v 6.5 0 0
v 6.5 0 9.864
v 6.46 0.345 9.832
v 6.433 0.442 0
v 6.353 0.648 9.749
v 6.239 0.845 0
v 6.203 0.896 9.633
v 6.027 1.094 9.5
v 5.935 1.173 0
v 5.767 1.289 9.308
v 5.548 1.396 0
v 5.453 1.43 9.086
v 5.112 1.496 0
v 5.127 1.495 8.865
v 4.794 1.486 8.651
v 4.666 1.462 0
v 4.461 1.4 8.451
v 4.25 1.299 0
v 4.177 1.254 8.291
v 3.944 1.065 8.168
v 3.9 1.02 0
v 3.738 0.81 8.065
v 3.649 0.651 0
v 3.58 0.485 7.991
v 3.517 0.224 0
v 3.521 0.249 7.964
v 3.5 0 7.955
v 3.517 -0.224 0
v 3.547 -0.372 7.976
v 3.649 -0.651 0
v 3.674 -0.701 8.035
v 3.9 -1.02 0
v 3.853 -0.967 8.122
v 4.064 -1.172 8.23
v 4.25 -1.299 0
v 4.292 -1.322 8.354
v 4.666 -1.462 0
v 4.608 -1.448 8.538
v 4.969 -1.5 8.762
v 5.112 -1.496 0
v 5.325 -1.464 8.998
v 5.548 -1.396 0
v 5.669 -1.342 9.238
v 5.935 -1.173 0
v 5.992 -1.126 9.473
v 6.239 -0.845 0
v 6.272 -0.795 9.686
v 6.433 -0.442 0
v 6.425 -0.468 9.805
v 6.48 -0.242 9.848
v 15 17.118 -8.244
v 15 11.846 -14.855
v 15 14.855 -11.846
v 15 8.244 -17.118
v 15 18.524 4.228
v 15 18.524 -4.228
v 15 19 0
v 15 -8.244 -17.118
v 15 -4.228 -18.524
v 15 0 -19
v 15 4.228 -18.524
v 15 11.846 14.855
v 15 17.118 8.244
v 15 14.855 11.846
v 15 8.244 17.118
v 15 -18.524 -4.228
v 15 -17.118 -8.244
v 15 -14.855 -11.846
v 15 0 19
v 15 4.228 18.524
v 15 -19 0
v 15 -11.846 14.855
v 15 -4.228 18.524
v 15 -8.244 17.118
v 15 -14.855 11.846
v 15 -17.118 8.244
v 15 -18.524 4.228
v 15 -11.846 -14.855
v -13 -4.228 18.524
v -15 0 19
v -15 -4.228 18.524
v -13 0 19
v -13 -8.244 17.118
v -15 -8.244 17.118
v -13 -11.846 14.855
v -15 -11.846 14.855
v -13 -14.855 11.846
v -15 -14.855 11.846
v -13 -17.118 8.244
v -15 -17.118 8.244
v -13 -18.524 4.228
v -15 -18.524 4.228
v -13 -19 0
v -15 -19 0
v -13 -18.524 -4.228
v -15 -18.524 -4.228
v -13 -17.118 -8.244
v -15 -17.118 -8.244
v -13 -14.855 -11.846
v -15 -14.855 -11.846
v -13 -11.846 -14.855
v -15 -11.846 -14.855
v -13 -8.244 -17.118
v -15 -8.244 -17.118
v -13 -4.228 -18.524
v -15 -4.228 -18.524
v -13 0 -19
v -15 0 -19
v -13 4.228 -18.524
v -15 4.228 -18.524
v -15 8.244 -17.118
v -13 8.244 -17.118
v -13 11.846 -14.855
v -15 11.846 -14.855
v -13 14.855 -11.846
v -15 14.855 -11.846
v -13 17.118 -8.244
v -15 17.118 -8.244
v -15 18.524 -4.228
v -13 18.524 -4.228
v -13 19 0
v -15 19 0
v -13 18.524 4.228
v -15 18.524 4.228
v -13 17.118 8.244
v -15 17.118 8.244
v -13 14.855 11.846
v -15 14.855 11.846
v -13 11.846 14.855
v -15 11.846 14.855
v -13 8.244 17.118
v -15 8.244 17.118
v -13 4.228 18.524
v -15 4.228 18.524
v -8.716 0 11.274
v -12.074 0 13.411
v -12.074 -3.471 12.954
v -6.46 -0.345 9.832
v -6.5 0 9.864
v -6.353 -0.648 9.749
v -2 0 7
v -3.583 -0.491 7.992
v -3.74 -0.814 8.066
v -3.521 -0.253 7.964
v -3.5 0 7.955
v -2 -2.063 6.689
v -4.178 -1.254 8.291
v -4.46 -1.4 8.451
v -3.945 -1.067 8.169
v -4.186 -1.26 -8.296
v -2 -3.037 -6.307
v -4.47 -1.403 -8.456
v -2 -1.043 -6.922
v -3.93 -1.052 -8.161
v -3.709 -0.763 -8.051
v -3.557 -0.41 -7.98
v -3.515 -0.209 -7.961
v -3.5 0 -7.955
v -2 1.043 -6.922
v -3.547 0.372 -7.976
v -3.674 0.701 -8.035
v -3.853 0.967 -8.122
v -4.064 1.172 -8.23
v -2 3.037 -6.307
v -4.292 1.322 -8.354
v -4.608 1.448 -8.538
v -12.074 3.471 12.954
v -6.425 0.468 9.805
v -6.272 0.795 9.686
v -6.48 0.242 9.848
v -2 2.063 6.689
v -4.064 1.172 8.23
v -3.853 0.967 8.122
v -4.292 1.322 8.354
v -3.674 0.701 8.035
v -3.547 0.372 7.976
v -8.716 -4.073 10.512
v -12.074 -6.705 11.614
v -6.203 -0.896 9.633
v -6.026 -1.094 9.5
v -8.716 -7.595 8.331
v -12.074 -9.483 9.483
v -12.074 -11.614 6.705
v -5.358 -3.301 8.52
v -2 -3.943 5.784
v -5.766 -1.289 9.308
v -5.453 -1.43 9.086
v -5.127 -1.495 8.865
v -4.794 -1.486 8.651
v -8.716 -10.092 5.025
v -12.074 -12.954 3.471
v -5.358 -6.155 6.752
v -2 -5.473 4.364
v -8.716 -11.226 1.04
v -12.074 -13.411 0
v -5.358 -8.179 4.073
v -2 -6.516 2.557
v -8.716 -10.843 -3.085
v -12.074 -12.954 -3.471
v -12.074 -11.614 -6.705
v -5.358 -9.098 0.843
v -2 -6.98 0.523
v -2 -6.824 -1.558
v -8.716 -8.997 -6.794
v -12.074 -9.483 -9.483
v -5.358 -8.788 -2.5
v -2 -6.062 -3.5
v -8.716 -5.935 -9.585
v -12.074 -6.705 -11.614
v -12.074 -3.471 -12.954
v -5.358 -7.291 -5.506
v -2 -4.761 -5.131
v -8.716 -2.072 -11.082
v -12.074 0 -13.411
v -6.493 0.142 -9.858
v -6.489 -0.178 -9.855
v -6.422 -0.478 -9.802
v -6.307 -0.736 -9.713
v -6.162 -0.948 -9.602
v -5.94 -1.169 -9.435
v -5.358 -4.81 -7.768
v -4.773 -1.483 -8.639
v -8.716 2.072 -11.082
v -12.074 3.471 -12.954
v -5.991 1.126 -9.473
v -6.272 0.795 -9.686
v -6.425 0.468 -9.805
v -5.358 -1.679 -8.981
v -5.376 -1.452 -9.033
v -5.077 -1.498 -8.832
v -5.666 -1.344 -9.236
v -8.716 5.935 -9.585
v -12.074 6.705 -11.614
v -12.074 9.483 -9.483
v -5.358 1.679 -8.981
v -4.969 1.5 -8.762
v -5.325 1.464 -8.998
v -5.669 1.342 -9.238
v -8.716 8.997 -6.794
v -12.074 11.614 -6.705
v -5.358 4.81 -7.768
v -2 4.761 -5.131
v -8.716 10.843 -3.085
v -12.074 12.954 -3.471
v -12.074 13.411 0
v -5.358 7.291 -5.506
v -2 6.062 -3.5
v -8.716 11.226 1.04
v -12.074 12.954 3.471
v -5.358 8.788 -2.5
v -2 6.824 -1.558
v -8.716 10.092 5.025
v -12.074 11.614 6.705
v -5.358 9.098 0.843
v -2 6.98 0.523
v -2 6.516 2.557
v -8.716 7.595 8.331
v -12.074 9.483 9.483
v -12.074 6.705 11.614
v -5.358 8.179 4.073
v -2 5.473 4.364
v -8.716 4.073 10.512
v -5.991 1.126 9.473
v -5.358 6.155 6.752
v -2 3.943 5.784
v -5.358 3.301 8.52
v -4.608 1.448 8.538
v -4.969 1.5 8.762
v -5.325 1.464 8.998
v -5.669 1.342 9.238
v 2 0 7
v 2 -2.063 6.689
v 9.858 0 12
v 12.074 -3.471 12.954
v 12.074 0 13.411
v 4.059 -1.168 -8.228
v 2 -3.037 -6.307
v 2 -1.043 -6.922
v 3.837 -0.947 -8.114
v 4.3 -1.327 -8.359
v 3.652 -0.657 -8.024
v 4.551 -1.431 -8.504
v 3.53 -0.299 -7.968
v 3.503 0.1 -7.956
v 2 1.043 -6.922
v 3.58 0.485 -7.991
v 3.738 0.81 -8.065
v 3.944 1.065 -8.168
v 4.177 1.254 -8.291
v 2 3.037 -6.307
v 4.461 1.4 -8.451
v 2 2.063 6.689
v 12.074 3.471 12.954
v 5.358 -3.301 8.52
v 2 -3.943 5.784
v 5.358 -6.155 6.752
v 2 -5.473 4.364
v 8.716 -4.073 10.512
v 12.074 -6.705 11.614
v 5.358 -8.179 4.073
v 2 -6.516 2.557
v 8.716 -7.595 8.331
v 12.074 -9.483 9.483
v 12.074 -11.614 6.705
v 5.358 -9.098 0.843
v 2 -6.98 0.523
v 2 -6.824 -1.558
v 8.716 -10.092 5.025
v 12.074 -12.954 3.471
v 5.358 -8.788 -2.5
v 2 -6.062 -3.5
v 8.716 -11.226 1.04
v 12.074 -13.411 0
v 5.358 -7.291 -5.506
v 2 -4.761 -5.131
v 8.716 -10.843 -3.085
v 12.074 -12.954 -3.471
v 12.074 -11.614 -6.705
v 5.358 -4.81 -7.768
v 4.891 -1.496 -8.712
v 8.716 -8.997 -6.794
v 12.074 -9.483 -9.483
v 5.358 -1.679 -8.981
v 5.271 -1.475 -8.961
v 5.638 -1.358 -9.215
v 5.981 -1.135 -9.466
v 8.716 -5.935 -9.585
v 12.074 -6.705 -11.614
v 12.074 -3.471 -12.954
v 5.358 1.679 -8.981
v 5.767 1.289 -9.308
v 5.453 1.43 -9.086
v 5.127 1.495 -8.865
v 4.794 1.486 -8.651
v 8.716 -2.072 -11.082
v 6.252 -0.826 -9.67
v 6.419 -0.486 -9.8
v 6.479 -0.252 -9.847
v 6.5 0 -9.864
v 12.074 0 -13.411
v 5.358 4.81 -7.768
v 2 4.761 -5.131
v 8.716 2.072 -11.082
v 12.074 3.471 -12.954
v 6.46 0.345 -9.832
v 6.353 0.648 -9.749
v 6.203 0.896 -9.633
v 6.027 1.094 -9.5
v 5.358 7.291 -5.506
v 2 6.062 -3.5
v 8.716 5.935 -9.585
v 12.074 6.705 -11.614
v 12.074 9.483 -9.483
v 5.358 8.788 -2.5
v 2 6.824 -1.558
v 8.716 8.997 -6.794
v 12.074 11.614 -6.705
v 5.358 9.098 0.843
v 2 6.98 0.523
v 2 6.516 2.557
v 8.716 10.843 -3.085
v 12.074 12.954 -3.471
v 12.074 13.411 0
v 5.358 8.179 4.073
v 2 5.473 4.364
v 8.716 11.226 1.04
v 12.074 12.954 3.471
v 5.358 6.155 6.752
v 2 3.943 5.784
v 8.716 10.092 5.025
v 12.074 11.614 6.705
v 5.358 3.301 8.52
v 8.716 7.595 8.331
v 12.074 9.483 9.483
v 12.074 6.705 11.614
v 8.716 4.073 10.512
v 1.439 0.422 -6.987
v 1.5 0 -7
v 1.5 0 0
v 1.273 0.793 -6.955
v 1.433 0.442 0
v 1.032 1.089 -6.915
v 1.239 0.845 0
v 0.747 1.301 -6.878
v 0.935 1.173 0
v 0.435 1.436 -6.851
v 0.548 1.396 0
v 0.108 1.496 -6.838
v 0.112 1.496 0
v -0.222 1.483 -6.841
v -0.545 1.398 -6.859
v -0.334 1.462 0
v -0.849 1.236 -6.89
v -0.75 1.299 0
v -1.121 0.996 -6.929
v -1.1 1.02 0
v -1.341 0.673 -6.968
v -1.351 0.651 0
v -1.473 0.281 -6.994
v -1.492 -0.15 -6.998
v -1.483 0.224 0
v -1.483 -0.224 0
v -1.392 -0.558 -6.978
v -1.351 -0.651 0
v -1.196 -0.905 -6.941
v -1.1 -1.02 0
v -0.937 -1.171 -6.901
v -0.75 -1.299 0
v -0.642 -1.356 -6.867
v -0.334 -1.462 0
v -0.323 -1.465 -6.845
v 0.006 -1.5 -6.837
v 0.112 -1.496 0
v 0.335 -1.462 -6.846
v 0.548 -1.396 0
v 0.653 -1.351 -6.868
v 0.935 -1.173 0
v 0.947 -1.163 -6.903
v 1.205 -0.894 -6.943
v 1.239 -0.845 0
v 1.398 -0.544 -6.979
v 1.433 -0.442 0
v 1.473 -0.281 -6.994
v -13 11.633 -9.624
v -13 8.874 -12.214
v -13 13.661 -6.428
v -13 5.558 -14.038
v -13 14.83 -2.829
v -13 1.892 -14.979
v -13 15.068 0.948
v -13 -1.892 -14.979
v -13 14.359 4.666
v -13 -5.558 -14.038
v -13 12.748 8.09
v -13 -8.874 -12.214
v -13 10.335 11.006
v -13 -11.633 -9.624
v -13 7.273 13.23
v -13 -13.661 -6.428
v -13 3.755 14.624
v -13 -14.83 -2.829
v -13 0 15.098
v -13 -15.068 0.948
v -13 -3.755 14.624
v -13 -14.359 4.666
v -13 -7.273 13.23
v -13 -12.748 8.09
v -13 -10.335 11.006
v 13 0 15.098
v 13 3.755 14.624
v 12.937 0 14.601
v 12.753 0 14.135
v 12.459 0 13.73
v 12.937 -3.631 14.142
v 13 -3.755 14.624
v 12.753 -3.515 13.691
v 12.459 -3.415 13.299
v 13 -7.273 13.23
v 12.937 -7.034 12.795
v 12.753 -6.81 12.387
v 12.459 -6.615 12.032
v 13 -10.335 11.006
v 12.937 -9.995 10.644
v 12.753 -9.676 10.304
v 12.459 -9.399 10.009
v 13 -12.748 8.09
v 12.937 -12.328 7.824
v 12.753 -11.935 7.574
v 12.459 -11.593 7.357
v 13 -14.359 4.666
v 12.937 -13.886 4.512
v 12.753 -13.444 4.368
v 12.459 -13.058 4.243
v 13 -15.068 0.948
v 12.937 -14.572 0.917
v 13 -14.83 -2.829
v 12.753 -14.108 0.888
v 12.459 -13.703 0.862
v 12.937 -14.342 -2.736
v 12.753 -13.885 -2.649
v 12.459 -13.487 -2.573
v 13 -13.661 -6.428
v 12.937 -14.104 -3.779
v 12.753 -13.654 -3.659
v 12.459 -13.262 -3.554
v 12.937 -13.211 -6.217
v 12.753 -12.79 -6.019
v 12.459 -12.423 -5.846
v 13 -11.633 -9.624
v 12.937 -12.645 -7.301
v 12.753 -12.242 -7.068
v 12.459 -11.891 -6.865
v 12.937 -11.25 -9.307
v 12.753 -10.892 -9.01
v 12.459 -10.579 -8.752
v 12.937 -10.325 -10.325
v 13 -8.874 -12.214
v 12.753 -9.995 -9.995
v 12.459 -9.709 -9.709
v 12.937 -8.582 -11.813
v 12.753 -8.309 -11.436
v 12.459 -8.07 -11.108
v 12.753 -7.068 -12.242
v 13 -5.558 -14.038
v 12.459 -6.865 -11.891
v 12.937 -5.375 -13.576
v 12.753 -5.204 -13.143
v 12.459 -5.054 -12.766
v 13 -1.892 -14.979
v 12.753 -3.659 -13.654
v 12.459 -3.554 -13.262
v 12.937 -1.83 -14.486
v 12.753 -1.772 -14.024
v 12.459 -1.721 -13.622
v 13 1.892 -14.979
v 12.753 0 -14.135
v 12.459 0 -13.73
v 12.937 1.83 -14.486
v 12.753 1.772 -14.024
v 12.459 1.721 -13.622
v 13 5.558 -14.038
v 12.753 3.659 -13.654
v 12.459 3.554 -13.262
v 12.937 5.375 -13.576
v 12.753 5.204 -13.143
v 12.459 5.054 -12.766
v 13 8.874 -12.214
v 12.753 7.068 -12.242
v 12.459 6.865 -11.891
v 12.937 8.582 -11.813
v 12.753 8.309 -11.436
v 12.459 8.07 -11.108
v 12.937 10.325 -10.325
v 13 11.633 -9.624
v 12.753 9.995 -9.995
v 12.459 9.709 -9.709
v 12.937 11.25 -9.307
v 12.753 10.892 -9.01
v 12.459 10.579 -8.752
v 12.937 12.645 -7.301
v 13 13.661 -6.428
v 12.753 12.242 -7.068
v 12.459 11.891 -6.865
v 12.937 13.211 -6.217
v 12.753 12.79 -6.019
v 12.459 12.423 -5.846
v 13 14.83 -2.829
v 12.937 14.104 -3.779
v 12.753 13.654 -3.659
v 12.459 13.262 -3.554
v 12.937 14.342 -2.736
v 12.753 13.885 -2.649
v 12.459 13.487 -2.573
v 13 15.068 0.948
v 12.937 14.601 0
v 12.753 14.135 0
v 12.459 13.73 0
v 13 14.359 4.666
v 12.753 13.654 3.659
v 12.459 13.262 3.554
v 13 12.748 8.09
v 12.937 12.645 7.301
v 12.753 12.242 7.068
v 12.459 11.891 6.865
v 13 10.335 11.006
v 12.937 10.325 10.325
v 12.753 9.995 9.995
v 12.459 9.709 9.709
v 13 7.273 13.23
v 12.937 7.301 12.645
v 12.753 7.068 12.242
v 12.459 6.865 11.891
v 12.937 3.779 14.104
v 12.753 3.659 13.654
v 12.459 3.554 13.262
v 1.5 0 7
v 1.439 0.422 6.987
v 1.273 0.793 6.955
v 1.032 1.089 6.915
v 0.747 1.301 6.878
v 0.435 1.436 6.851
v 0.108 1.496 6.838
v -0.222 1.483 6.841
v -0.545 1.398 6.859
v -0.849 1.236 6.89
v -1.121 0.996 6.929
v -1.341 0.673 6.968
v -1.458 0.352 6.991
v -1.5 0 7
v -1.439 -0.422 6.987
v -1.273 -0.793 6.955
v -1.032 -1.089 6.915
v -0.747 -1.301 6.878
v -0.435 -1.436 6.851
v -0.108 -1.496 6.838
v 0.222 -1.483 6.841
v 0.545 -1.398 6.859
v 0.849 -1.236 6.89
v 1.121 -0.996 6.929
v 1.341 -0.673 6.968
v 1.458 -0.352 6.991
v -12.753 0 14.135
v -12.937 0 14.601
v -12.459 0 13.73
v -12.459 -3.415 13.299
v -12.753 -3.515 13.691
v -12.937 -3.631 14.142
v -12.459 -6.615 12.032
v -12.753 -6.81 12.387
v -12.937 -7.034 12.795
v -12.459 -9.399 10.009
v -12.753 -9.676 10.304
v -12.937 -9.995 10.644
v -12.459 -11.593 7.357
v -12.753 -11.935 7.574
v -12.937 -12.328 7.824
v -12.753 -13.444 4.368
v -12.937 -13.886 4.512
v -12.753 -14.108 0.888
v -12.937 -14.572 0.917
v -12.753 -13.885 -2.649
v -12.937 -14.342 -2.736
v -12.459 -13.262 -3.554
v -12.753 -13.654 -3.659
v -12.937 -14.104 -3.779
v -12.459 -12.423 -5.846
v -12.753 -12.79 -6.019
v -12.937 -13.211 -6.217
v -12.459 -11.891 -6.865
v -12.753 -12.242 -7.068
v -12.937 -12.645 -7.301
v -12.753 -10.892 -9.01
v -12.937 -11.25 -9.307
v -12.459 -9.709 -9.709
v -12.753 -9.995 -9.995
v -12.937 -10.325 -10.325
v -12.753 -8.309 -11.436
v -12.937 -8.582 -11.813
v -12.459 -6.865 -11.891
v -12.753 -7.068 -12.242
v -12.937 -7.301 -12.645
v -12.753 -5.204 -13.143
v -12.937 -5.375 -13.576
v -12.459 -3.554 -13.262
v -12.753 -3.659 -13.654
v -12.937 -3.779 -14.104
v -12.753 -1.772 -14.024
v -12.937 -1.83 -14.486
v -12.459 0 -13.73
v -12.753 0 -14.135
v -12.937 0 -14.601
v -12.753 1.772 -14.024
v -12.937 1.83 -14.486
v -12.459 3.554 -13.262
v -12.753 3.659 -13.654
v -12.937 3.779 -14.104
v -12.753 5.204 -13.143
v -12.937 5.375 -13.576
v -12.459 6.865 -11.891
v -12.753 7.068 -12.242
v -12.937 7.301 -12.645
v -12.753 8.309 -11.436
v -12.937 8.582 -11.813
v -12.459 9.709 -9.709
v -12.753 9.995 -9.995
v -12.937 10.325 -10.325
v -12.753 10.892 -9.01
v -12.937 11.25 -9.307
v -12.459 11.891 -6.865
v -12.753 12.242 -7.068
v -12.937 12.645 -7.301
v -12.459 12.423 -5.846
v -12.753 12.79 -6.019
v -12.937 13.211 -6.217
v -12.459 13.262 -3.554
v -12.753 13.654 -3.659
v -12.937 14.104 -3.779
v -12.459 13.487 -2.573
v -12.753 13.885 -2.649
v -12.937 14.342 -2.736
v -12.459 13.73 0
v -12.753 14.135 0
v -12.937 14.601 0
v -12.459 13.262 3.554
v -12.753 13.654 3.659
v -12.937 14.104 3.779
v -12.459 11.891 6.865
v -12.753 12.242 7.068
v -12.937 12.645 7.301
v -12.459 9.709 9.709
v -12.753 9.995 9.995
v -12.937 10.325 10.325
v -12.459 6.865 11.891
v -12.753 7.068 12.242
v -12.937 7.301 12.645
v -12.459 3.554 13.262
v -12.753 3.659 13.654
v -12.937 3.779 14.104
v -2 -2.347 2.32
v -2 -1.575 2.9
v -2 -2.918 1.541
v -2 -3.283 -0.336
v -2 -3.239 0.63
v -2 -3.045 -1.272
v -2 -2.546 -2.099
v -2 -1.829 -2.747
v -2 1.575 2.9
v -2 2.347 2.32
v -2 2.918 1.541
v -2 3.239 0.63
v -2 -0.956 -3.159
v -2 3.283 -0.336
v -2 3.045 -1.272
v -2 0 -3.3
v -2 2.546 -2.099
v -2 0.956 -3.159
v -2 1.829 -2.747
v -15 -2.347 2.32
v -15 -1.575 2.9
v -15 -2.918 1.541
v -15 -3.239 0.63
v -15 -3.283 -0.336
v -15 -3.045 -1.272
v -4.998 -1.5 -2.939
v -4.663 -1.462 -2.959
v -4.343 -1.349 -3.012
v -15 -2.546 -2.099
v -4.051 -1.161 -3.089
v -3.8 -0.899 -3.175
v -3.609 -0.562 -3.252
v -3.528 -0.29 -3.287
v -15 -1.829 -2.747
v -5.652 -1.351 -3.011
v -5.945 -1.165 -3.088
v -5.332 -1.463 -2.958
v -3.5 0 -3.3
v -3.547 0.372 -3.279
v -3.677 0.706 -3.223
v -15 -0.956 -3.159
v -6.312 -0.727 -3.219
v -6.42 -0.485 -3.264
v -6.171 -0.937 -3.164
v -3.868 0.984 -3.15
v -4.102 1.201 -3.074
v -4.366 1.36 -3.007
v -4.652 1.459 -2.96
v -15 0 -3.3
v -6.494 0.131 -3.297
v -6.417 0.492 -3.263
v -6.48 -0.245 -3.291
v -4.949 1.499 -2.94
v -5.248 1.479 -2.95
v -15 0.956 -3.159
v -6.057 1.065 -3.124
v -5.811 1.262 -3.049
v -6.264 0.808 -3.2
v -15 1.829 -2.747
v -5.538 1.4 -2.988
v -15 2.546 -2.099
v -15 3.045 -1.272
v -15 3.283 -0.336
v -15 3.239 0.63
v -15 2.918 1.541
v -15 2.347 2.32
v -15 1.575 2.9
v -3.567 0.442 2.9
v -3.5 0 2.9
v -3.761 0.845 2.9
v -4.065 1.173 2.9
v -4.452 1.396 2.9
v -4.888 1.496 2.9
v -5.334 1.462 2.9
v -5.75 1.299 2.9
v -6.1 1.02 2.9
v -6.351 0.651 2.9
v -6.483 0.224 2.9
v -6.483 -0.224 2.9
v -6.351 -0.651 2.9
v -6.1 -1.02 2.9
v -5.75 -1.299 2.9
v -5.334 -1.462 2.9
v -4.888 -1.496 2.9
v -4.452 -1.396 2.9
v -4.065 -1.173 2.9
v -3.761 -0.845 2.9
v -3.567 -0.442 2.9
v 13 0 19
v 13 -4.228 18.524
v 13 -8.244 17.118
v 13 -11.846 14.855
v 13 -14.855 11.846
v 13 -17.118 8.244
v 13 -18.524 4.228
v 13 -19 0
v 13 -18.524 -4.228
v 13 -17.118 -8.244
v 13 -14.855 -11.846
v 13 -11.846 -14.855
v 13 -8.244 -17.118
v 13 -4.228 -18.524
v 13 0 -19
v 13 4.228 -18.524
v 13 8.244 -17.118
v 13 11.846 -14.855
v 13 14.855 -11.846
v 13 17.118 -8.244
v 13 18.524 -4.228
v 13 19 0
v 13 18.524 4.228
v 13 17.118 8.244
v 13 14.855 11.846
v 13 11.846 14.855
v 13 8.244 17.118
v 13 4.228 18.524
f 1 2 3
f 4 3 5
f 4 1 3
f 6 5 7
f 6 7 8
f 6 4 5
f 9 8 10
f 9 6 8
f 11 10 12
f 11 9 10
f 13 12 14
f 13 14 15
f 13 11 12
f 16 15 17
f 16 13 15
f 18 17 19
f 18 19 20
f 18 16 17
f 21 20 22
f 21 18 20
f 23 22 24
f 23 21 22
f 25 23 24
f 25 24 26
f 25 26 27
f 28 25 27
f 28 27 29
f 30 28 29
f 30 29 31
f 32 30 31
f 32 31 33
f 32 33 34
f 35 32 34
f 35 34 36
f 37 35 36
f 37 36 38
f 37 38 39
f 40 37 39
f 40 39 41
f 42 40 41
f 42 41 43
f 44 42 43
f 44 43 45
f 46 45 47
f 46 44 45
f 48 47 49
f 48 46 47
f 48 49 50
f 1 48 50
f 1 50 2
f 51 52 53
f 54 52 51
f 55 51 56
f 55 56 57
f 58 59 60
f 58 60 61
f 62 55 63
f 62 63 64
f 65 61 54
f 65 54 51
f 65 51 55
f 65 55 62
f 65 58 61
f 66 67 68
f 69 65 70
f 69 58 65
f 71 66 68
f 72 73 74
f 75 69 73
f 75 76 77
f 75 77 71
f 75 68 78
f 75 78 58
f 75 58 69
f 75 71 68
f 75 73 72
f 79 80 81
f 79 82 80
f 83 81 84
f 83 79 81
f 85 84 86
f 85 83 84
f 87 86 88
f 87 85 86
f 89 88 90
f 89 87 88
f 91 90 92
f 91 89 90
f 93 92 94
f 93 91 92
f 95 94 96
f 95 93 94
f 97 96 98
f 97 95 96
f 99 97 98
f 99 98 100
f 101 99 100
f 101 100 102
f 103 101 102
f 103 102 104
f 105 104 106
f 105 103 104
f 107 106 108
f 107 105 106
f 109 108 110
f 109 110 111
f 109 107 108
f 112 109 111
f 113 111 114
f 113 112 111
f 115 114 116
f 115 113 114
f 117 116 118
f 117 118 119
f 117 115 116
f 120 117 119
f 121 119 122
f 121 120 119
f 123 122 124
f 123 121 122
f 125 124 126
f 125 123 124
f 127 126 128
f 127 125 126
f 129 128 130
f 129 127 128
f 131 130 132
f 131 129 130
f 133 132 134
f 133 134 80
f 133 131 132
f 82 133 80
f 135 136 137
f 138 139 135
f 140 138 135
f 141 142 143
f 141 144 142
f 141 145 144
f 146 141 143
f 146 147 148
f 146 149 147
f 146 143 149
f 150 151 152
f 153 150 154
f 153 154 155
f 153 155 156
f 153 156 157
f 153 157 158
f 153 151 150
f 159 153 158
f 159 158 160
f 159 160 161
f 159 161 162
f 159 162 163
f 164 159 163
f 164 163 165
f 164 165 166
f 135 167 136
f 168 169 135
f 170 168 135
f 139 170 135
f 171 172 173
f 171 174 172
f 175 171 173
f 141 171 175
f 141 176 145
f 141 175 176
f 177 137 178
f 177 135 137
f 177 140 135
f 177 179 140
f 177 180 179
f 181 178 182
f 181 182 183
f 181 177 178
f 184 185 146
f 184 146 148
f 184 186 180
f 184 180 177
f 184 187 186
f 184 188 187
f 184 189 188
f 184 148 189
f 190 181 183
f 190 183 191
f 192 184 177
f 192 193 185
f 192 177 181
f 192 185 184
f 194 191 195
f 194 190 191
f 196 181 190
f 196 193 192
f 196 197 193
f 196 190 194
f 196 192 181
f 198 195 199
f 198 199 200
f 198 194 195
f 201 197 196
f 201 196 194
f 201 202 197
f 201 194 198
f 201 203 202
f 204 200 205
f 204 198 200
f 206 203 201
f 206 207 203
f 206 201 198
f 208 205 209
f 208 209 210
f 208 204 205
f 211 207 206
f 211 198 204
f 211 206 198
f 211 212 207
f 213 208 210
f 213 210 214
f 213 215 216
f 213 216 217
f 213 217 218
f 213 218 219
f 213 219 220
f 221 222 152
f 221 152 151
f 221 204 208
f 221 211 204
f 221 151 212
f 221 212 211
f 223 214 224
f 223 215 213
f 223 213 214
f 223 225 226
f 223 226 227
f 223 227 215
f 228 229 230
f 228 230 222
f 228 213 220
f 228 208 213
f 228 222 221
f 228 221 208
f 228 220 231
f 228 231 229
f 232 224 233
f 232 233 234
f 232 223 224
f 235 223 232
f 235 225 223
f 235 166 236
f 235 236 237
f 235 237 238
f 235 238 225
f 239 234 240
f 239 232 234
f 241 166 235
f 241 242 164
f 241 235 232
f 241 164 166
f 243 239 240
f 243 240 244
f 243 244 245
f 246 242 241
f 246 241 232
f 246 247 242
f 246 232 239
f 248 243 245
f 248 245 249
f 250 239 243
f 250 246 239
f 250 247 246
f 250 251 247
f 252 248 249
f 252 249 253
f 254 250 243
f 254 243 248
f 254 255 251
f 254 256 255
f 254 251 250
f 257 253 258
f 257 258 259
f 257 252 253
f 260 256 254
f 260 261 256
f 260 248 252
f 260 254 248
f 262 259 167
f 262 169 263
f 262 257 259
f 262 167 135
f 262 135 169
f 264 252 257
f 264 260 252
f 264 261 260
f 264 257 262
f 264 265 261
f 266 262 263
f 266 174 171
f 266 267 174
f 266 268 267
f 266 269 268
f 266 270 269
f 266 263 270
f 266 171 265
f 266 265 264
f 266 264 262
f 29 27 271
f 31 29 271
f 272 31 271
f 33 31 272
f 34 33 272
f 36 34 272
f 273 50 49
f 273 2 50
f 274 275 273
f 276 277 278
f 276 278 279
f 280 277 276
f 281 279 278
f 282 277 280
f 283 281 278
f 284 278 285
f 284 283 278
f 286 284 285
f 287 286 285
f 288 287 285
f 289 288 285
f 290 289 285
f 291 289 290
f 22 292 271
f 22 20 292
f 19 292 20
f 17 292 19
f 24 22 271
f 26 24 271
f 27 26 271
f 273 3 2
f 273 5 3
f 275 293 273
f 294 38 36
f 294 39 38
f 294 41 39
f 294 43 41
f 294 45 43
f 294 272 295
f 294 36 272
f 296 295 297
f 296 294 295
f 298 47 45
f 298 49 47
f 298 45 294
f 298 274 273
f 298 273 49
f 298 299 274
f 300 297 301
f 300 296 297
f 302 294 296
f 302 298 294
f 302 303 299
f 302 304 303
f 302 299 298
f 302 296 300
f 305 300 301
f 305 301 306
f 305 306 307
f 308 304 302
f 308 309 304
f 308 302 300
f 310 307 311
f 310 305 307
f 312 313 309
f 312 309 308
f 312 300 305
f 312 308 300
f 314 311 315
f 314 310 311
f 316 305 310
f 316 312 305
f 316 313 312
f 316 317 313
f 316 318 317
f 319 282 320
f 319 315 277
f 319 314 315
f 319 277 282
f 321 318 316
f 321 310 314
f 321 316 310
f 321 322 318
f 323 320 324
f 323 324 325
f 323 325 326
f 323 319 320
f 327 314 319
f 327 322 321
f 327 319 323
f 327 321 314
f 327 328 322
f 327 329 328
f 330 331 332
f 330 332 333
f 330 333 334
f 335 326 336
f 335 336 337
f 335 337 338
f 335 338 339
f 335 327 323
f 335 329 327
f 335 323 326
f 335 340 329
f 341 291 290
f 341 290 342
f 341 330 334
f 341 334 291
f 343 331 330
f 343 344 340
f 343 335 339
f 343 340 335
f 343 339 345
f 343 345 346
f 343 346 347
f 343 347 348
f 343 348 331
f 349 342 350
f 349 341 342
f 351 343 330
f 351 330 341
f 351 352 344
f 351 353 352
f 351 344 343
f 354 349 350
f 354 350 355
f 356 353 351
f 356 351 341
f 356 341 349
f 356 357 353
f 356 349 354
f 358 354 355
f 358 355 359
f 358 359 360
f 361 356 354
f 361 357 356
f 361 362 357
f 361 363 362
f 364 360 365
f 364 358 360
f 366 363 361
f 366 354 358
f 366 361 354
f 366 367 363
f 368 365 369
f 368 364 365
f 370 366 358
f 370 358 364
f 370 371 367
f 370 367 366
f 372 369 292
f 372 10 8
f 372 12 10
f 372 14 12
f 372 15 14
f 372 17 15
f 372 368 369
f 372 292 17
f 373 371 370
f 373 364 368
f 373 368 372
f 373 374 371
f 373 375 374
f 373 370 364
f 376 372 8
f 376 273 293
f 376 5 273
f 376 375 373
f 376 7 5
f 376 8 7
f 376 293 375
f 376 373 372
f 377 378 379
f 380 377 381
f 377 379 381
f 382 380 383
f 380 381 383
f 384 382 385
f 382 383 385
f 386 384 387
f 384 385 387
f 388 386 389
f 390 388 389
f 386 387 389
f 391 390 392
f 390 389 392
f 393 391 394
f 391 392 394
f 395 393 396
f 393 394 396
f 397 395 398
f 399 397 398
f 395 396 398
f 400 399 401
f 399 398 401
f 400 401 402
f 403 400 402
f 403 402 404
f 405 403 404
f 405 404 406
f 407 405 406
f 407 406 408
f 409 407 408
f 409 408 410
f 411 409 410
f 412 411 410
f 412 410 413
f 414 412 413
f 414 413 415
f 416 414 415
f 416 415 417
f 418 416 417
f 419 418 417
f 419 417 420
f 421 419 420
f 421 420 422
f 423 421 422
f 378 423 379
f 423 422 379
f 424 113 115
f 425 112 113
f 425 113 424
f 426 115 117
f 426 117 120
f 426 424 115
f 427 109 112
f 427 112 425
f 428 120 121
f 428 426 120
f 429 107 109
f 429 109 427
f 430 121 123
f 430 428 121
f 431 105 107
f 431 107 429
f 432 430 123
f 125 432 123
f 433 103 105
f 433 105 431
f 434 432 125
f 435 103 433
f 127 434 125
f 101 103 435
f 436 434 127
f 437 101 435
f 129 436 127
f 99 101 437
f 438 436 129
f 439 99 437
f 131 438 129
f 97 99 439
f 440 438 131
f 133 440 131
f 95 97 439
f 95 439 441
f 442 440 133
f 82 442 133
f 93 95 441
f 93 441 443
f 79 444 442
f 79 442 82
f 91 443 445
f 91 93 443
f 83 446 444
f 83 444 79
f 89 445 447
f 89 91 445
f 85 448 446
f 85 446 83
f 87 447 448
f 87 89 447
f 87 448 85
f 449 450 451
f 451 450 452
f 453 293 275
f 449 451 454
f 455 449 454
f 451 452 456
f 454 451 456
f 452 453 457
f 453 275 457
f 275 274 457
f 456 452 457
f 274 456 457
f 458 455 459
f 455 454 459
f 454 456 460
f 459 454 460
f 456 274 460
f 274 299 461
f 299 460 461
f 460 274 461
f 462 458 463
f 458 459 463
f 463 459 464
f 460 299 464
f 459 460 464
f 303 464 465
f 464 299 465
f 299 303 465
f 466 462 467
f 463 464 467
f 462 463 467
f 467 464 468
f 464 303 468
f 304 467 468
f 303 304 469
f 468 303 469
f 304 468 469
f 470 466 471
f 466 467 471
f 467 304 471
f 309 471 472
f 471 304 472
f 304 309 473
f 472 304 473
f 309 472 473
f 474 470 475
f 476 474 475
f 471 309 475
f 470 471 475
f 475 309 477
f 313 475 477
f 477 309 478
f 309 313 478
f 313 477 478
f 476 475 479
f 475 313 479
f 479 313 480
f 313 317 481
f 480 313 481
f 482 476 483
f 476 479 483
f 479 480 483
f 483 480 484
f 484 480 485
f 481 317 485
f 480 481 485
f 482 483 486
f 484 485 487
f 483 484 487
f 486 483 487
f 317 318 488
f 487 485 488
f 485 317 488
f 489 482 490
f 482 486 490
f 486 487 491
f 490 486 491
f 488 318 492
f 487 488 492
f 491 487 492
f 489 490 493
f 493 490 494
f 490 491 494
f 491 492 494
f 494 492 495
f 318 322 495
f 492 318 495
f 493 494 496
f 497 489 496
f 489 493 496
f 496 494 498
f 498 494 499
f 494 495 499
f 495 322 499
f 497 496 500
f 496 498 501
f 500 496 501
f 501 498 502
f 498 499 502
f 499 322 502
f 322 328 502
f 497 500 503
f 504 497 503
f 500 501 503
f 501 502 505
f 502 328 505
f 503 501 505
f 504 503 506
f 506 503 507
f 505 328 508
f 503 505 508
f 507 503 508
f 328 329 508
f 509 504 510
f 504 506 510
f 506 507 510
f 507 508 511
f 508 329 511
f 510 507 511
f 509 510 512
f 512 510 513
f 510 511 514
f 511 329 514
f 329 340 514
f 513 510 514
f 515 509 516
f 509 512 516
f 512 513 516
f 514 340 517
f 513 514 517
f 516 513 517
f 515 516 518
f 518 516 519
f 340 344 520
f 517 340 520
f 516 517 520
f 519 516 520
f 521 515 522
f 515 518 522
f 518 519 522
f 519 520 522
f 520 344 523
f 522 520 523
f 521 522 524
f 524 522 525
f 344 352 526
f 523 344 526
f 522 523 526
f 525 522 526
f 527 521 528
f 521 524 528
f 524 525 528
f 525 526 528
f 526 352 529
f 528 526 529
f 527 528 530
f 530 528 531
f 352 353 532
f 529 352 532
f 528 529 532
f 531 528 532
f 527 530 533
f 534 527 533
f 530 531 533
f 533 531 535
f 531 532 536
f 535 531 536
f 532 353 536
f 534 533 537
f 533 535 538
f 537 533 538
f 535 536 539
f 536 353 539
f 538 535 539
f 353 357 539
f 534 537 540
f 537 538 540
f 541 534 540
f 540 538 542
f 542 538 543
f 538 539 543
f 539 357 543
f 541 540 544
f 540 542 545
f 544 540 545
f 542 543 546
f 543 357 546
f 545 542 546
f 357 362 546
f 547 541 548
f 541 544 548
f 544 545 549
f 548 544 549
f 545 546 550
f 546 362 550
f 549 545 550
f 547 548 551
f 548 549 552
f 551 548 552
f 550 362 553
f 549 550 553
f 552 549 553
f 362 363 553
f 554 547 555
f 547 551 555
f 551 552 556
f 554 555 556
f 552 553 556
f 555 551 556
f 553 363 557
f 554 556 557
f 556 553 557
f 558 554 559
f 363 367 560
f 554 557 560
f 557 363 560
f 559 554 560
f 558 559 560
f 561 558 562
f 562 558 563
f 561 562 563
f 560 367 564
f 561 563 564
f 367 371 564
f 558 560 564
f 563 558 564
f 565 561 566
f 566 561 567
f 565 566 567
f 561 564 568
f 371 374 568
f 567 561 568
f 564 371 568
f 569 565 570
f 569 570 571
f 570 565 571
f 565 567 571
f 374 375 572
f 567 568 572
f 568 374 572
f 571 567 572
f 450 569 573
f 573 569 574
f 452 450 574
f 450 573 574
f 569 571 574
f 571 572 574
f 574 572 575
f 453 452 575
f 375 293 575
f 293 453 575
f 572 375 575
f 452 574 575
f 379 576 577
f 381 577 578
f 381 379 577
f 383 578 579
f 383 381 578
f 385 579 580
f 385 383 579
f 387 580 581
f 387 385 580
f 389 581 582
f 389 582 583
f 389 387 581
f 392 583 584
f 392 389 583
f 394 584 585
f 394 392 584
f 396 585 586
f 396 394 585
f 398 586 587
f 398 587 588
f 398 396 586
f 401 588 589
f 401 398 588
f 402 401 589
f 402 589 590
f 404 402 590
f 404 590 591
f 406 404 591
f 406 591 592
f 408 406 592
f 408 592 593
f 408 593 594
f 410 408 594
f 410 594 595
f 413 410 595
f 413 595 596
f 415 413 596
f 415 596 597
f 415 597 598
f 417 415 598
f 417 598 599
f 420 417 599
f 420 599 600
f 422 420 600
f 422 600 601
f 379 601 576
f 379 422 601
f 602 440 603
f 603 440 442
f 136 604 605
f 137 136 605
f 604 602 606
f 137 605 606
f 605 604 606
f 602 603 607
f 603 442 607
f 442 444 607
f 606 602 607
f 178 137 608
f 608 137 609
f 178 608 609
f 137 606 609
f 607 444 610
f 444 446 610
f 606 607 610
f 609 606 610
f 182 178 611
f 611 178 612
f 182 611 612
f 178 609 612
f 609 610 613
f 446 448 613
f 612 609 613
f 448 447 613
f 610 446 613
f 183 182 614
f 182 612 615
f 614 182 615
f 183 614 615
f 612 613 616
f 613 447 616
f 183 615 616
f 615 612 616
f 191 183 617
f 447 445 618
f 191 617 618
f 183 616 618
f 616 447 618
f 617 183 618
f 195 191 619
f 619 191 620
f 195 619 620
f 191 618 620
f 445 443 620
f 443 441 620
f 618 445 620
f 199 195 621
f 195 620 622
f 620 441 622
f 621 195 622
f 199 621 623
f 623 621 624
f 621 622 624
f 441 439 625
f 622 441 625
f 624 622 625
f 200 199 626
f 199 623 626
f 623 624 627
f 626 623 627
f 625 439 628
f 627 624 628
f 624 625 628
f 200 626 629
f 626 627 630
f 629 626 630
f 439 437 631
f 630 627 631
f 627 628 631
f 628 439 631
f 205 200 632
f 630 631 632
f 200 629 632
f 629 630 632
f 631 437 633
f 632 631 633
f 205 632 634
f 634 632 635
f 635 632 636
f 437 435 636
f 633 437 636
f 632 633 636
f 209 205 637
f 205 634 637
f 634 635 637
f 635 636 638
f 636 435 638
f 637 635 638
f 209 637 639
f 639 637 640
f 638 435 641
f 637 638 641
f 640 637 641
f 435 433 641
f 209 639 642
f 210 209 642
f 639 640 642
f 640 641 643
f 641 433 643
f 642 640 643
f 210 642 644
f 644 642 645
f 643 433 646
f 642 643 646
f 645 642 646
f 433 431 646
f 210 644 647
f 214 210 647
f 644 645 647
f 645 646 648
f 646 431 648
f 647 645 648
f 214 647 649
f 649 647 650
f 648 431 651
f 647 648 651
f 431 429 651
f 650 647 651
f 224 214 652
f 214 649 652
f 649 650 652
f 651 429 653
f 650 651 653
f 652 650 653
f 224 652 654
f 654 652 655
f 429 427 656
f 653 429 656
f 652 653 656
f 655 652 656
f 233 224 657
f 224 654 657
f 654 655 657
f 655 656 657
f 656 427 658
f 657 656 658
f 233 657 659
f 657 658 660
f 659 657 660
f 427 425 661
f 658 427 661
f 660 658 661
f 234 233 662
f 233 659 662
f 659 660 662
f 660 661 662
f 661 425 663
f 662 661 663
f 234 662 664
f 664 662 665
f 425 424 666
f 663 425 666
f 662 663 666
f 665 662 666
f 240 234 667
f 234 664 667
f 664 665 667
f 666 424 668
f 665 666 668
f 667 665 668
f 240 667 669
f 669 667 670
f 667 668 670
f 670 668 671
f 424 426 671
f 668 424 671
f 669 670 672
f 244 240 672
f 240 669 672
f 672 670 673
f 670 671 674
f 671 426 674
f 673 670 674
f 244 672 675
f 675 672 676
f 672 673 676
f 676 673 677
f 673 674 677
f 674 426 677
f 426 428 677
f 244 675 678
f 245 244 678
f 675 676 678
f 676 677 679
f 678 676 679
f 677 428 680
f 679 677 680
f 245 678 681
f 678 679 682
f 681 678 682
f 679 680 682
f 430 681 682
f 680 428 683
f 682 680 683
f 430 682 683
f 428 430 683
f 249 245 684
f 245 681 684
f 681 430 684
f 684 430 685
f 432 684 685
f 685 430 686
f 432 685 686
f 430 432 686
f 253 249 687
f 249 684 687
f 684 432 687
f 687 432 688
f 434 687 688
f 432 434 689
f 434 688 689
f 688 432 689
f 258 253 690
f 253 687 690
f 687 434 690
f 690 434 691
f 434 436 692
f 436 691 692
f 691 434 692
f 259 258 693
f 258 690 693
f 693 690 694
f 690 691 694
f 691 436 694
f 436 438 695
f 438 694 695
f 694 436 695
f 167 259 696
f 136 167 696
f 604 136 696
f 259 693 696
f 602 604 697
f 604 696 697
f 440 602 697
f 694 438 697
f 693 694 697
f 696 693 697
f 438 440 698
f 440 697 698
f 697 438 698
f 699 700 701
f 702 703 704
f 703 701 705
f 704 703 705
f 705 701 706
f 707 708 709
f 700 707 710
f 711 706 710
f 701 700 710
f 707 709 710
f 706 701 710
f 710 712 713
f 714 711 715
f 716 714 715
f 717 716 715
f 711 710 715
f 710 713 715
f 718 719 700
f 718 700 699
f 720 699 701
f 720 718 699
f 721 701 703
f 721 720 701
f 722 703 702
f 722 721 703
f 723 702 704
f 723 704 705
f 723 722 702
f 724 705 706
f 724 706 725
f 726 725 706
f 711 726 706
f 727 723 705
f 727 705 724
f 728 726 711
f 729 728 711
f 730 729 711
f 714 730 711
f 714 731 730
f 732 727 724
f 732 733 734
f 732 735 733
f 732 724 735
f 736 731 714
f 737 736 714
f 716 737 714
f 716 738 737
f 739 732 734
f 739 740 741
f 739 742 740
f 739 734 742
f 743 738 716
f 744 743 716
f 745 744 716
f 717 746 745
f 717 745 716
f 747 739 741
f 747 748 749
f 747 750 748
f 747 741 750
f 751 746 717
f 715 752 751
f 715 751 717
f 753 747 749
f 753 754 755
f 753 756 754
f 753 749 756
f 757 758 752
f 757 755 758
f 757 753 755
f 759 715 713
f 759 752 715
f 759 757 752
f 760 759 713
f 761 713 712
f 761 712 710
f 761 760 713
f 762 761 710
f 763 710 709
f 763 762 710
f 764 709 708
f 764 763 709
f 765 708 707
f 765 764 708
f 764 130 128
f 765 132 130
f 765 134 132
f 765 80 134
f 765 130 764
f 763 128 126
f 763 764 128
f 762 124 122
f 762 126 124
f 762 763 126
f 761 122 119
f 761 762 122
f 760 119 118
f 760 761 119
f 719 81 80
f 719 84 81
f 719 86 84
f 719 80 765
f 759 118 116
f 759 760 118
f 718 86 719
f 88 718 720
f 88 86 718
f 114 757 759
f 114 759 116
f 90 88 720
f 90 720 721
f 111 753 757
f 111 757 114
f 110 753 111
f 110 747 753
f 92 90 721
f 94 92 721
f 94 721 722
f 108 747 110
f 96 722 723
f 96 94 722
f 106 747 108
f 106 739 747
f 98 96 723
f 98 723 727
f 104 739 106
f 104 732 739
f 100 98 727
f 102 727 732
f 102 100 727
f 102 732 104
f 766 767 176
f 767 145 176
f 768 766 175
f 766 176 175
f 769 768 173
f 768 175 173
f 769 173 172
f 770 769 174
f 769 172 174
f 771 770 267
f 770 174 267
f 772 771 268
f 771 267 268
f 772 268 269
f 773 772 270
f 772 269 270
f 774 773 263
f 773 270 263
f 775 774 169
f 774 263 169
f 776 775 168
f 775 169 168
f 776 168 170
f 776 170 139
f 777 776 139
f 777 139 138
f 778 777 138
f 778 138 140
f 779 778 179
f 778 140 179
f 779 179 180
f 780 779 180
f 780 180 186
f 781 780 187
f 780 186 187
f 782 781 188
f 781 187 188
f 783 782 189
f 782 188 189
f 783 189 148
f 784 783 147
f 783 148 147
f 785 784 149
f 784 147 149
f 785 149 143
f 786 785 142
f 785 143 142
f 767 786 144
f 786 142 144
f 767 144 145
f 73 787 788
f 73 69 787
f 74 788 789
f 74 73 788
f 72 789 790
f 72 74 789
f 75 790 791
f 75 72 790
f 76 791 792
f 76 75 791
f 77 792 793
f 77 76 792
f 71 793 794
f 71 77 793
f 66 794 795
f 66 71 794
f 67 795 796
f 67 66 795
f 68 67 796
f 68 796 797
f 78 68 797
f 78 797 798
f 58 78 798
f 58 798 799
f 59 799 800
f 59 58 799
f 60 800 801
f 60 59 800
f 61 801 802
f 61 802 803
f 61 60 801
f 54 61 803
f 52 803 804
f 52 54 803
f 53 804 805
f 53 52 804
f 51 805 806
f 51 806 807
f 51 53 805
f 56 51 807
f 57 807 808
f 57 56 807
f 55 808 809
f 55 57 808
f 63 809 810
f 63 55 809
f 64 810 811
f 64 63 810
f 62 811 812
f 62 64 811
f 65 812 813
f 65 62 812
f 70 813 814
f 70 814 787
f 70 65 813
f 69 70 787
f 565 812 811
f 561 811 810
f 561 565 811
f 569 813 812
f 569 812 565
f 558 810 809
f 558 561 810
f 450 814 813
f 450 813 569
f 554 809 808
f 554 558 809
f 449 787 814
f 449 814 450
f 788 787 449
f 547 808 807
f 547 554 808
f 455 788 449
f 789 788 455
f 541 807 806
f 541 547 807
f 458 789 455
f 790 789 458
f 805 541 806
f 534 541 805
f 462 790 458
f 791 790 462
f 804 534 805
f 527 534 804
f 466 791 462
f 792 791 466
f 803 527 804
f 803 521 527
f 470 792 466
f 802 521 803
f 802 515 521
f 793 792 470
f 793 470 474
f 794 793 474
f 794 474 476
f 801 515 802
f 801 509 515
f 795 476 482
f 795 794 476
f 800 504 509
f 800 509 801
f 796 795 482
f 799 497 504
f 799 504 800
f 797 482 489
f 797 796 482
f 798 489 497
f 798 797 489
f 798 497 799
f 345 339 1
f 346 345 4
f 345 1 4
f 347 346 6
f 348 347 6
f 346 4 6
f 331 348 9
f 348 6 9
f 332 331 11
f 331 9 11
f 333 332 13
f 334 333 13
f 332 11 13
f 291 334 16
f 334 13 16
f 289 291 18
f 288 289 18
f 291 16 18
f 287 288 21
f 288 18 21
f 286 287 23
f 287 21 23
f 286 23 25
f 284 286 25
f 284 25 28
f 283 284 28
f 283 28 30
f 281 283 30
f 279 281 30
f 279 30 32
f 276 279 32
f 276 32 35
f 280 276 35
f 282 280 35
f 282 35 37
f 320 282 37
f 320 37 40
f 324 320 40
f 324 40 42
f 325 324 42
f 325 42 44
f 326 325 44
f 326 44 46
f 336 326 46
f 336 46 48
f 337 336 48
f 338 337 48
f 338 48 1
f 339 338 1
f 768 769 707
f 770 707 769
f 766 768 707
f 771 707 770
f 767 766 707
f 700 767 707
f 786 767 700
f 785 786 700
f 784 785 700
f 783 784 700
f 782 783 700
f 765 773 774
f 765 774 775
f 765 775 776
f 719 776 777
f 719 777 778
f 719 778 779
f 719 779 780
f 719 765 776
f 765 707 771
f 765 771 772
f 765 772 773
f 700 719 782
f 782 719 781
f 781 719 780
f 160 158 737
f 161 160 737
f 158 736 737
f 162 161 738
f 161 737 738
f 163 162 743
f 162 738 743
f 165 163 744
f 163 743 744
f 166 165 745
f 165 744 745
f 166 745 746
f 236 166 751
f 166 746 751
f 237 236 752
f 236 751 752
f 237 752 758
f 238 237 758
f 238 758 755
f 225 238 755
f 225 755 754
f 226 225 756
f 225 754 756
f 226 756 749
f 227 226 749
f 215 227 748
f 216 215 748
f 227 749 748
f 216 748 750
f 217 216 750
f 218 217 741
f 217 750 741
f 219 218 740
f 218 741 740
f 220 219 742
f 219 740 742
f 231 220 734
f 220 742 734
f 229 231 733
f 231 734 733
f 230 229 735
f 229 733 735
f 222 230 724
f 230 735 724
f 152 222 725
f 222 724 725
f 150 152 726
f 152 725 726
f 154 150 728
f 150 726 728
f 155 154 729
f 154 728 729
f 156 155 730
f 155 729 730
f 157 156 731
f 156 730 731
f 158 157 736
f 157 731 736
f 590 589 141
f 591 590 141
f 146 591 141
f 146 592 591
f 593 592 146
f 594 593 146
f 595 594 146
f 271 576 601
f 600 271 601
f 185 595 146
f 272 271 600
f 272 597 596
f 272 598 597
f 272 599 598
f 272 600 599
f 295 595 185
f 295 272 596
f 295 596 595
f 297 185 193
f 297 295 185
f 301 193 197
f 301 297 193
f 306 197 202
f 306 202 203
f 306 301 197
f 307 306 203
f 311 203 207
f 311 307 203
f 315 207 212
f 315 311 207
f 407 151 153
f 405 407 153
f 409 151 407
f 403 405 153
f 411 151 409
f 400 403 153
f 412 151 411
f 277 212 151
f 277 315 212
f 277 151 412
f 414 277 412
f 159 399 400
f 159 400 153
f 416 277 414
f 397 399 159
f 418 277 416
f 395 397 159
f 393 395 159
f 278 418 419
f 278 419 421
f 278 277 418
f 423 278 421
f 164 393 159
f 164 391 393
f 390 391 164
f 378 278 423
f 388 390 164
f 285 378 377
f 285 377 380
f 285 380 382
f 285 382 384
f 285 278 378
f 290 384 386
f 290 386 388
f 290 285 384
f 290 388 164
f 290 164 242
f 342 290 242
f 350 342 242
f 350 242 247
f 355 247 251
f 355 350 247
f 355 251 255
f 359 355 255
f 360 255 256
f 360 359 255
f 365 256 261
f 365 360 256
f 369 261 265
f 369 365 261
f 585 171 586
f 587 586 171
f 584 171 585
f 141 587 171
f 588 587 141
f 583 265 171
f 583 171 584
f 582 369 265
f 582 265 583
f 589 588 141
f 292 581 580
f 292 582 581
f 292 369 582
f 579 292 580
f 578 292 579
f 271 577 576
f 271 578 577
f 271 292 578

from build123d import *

# Parameters (mm, degrees)
MOTOR_SHAFT_DEPTH  = 13
SKETCH4_R          = 1.5
CUT_EXTRUDE2_DEPTH = 17.5
FILLET1_R          = 2


with BuildPart() as part:
    # Sketch2 → Revolve1 (revolve)
    with BuildSketch(Plane.XY, mode=Mode.PRIVATE) as revolve1_sk:
        Polygon((13, 14), (13, 19), (15, 19), (15, 0), (-15, 0), (-15, 19), (-13, 19), (-13, 14), (-2, 7), (2, 7), align=None)
    revolve(revolve1_sk.sketch.rotate(Axis((0, 0, 0), (1, 0, 0)), 90), axis=Axis((0, 0, 0), (1, 0, 0)))

    # Sketch3 → motor shaft (cut)
    with BuildSketch(Plane.ZY.offset(15)):
        with BuildLine():
            Line((2.9, 1.574801575), (2.9, -1.574801575))
            ThreePointArc((2.9, -1.574801575), (-3.3, 0), (2.9, 1.574801575))
        make_face()
    extrude(amount=-MOTOR_SHAFT_DEPTH, mode=Mode.SUBTRACT)

    # Sketch4 → Cut-Extrude2 (cut, symmetric)
    with BuildSketch(Plane.XY):
        Circle(SKETCH4_R)
        with Locations(Location((5, 0, 0), (0, 0, 3.47e-07))):
            Circle(SKETCH4_R)
        with Locations((-5, 0)):
            Circle(SKETCH4_R)
    extrude(amount=CUT_EXTRUDE2_DEPTH, both=True, mode=Mode.SUBTRACT)

    # Fillet1
    fillet1_edges = [part.edges().sort_by_distance(p)[0] for p in [
        (13, 0, -14),
        (-13, 0, -14),
    ]]
    fillet(fillet1_edges, radius=FILLET1_R)


solid = part.part
